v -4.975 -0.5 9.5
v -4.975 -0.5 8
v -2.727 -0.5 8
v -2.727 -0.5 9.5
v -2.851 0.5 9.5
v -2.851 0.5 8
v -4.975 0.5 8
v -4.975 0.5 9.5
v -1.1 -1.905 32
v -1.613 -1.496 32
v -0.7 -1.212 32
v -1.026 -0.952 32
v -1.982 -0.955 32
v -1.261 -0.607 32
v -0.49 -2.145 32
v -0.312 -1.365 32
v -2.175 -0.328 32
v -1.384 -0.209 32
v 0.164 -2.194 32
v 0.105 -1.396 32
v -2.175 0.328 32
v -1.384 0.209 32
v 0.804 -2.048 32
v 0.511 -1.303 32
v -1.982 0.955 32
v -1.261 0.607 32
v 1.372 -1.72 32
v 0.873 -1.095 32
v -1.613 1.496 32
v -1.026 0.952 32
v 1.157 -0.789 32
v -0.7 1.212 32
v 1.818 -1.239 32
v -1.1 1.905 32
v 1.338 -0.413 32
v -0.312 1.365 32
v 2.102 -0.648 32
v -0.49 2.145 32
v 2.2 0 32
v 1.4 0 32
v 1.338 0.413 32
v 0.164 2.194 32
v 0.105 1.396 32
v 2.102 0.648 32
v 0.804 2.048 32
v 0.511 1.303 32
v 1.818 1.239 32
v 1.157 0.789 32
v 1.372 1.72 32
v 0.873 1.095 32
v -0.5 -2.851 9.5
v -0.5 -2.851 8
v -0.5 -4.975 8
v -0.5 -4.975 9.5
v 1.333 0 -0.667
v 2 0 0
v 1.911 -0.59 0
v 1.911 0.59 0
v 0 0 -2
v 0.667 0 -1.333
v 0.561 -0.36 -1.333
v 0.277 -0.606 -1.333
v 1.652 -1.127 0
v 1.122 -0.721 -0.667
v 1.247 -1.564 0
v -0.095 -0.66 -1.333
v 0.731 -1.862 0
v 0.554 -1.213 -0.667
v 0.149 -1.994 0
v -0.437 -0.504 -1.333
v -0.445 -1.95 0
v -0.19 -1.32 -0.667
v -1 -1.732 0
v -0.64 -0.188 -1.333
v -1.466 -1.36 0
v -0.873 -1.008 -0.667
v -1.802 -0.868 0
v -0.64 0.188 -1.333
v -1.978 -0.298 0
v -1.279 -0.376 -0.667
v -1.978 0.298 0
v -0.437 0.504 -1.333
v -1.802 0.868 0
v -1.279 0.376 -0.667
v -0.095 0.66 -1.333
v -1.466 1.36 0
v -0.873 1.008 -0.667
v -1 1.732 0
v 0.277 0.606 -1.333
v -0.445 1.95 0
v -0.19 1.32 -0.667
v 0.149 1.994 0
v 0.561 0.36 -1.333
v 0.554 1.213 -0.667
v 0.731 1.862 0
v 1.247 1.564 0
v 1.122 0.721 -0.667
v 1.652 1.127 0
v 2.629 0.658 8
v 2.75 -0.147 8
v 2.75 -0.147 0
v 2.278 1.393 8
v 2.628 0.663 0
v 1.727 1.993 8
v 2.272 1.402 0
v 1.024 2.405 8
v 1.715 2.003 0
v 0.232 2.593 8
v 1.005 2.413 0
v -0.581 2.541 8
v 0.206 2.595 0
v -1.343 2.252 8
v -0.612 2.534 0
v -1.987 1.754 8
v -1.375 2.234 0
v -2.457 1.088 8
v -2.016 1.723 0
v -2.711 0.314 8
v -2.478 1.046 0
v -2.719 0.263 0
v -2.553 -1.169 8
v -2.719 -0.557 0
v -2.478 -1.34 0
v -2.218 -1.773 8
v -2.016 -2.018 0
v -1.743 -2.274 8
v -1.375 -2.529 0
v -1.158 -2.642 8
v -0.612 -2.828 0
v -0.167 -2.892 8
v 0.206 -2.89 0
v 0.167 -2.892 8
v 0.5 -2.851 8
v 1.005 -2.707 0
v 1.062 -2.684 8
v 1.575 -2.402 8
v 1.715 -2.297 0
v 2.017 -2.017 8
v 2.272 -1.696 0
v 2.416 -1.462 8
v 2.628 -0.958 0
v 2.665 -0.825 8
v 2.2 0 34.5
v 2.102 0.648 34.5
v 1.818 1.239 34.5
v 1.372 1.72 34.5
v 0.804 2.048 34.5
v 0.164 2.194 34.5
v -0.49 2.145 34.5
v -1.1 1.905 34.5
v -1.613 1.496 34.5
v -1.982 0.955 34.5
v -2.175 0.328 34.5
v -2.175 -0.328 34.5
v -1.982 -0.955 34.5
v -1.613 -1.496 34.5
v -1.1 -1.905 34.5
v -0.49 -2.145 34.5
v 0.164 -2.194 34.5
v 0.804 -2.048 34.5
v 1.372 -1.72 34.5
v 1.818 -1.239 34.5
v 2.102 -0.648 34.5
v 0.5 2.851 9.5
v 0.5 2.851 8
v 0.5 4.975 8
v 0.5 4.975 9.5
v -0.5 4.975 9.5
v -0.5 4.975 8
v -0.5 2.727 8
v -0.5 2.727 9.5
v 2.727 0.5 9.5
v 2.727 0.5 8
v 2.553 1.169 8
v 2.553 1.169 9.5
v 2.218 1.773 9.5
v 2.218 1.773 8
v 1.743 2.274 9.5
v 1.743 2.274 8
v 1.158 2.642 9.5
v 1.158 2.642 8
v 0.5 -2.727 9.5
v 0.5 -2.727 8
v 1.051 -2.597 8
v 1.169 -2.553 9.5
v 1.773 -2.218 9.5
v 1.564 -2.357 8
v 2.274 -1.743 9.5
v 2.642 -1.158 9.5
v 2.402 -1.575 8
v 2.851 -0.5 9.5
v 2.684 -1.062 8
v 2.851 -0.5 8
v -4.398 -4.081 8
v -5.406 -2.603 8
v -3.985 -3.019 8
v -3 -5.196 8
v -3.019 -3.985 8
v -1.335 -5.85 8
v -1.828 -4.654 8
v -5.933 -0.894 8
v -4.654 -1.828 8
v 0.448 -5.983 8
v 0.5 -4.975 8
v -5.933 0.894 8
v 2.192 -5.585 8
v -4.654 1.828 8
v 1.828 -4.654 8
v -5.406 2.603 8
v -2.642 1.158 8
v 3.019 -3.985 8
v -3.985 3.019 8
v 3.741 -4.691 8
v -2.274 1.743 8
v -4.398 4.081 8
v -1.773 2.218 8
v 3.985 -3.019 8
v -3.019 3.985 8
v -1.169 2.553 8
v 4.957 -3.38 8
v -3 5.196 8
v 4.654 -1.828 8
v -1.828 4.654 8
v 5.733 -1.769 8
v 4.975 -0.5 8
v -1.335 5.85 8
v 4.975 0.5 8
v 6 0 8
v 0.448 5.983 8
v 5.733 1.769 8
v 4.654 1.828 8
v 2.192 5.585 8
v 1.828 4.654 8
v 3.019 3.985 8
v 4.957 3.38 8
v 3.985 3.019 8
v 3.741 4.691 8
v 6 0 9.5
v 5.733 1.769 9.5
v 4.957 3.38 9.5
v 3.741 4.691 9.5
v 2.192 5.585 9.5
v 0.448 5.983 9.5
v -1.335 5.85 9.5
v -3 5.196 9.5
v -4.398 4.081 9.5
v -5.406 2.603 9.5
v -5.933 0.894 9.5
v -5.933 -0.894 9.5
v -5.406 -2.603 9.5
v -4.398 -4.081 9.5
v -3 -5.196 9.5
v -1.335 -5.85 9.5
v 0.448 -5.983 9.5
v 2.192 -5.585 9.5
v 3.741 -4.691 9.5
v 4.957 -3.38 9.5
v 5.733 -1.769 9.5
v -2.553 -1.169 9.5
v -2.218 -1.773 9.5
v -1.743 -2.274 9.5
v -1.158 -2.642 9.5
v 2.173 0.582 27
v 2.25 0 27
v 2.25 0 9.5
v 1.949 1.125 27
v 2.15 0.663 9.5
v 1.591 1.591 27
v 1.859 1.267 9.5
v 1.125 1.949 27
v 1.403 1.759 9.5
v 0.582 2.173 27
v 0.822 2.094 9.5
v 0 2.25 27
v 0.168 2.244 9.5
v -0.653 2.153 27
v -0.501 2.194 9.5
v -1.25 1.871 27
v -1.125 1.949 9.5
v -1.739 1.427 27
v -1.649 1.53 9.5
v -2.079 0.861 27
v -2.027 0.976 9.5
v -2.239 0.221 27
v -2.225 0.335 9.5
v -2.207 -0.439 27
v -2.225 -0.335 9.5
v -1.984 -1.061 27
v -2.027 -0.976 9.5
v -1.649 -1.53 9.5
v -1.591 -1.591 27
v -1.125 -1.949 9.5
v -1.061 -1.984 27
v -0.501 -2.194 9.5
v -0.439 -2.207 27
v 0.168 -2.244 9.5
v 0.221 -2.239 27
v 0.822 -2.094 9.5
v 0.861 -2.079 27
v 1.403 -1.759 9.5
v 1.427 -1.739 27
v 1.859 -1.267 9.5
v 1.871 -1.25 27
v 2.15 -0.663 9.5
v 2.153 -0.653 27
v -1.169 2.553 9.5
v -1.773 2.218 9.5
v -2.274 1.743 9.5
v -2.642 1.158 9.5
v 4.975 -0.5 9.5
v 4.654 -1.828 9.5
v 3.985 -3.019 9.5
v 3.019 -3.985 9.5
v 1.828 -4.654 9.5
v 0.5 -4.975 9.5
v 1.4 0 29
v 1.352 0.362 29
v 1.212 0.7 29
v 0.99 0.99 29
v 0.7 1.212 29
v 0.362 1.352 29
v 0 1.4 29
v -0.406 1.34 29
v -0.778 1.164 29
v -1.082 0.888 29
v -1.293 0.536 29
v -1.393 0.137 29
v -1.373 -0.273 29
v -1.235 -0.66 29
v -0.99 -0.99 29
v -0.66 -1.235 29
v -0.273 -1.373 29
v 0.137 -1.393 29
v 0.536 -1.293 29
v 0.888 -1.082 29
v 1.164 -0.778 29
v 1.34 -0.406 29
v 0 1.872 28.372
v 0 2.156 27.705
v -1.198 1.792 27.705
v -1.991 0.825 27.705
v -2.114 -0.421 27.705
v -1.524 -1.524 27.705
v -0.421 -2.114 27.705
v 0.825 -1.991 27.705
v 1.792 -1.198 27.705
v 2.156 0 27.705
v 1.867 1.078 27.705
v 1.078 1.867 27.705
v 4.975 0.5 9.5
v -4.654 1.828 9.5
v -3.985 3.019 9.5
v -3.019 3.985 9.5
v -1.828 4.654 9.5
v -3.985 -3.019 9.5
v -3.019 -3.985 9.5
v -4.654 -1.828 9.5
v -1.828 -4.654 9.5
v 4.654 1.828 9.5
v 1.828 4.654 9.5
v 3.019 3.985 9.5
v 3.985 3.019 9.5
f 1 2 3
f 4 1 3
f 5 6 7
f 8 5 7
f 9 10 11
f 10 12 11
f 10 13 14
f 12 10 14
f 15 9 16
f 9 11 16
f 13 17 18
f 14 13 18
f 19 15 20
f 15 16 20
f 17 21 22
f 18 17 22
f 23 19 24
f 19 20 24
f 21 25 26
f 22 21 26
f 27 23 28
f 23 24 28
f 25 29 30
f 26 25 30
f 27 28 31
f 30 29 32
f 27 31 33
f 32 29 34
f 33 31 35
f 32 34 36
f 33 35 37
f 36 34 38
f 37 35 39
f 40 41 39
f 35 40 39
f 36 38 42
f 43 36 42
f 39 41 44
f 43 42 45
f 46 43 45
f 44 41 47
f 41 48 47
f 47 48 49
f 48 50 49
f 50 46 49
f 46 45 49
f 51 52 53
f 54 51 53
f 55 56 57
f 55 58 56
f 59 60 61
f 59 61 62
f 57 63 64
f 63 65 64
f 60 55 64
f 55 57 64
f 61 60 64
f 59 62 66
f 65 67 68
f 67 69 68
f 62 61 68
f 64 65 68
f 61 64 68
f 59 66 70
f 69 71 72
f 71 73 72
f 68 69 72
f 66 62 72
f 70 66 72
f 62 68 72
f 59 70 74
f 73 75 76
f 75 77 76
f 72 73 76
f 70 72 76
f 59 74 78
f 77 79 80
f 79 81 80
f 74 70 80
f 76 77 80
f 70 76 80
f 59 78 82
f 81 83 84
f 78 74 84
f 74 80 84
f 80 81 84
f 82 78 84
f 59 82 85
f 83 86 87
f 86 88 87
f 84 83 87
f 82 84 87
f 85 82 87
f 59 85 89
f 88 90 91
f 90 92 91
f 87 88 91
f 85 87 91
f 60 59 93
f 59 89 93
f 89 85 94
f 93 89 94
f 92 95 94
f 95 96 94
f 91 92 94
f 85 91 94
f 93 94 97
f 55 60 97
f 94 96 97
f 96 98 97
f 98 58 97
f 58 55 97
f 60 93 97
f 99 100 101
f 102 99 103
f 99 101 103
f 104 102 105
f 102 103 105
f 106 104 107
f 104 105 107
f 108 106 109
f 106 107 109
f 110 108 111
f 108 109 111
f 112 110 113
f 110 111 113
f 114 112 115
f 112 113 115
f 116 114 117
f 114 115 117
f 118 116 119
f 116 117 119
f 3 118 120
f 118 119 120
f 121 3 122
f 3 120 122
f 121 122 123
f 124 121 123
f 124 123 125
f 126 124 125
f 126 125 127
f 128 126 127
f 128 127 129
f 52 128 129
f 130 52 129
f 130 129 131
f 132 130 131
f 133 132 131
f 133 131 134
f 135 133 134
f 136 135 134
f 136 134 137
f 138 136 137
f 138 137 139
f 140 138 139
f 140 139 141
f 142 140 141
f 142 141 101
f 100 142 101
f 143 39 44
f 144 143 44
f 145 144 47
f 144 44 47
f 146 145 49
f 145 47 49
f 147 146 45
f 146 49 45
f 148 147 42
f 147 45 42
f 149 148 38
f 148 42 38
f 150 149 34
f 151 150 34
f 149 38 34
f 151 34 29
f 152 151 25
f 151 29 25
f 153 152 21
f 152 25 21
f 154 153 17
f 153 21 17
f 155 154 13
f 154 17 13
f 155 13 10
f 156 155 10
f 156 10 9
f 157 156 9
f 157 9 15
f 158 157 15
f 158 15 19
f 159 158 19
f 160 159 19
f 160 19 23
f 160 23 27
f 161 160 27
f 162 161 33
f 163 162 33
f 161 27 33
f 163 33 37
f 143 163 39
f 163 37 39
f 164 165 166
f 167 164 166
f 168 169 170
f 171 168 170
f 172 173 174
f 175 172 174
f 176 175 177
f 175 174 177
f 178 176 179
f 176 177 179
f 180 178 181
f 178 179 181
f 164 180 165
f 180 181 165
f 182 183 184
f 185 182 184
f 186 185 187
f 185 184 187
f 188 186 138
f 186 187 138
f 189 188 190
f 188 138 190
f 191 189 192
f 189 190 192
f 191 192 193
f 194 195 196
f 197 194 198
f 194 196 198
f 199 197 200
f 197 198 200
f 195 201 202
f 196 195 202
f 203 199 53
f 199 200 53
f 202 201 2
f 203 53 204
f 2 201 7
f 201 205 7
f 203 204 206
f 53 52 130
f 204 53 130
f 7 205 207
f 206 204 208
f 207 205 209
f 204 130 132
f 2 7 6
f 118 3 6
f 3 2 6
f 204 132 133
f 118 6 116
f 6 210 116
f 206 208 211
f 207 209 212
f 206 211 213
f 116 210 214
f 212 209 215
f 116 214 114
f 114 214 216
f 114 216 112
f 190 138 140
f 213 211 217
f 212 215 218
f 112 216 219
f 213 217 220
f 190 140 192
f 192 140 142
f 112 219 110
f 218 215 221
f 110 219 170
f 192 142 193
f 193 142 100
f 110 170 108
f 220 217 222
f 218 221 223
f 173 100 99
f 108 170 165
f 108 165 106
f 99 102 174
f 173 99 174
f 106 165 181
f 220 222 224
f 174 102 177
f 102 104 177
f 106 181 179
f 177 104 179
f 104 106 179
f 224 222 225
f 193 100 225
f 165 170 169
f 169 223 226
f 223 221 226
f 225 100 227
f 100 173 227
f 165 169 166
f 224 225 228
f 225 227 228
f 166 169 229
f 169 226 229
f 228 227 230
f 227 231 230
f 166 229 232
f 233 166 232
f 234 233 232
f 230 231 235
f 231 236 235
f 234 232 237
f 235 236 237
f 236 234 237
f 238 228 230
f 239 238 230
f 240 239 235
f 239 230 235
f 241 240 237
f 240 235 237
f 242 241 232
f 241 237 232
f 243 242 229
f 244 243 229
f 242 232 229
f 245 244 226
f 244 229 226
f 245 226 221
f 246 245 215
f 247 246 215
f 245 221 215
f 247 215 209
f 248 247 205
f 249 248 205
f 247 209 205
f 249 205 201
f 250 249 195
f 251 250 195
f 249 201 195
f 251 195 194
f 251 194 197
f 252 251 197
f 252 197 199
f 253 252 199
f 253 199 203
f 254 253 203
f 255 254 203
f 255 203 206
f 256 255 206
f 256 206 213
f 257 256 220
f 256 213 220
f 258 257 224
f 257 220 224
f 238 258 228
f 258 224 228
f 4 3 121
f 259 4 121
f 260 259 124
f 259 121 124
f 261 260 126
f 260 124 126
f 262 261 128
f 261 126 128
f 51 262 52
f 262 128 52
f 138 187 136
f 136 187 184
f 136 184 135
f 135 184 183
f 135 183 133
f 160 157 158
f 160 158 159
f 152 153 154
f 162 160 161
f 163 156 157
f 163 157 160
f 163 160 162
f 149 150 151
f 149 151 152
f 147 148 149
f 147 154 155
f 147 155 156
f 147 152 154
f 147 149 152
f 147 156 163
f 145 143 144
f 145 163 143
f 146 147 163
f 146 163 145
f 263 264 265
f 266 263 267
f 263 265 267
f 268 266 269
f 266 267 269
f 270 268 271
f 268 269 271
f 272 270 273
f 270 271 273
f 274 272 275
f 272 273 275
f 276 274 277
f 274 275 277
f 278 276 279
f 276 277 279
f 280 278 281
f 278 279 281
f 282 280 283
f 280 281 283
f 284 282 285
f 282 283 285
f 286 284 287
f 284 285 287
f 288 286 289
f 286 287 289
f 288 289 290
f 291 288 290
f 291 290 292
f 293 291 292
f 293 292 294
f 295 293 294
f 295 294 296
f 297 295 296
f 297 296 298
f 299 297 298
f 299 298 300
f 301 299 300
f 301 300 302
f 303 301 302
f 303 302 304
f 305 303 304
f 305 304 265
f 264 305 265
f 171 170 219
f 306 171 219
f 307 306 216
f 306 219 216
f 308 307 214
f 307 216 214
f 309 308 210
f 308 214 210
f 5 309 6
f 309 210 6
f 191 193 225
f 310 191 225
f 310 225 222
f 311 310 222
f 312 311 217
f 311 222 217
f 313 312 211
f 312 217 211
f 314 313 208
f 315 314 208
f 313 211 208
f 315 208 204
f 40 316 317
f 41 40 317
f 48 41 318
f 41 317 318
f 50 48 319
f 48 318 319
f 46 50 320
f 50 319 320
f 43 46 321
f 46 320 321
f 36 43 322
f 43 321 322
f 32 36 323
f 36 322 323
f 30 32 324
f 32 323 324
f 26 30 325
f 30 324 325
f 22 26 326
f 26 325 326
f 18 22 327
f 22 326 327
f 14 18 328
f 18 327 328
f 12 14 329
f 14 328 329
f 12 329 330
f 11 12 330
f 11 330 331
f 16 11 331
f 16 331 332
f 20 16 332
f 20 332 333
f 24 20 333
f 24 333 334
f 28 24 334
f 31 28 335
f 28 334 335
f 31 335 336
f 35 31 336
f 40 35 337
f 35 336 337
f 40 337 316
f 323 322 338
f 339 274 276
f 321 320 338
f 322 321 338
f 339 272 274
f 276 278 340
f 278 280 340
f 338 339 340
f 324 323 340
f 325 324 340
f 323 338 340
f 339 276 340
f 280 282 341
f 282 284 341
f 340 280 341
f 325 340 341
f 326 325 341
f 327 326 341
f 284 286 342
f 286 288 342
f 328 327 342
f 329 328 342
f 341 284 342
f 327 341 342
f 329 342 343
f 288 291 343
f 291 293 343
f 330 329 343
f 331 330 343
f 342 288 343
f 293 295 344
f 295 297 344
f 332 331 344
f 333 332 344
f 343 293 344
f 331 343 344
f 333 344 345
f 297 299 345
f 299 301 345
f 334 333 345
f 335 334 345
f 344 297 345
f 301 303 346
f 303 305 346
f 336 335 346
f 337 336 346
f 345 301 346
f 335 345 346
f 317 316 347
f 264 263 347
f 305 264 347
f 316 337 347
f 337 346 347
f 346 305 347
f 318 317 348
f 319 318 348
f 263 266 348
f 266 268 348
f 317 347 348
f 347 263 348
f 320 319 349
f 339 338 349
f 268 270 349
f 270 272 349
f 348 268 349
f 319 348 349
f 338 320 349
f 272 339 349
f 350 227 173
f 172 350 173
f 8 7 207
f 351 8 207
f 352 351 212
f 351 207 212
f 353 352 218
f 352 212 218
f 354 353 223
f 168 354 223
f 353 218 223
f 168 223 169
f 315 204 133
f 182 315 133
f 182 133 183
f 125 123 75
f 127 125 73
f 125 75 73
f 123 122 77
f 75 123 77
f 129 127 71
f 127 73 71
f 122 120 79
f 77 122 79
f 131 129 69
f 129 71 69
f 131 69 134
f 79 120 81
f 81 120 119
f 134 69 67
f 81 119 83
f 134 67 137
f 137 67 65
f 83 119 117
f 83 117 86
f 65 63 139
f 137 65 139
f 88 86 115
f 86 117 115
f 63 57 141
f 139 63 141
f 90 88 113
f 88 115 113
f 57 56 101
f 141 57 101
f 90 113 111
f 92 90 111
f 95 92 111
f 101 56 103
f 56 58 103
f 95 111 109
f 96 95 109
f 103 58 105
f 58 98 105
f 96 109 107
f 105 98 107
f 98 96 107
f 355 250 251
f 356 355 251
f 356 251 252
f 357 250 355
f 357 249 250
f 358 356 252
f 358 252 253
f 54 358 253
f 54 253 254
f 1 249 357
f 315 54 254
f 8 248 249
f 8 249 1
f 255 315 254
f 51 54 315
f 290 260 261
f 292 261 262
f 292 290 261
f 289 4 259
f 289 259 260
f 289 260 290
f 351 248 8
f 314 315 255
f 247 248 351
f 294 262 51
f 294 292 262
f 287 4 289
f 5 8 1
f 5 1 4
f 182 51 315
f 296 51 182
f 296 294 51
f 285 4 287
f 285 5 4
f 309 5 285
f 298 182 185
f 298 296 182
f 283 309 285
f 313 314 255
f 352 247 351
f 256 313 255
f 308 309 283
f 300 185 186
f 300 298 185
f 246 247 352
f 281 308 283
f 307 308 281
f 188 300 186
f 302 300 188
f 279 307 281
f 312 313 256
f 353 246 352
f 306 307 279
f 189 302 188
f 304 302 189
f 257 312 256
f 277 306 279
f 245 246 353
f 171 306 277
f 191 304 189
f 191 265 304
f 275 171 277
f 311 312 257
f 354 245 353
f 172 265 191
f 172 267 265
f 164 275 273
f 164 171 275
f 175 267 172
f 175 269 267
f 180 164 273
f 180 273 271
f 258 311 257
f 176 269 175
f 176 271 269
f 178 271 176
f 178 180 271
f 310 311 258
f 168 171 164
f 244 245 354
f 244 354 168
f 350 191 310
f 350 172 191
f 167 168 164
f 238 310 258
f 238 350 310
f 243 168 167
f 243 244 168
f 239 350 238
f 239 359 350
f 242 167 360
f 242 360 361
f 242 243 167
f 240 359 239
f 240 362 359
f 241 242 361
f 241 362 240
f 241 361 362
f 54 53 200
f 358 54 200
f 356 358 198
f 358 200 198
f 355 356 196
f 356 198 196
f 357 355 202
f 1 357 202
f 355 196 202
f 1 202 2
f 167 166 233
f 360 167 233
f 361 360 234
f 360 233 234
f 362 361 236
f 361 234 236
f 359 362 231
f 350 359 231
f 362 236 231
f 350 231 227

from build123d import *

# Parameters (mm, degrees)
SKETCH1_R           = 2.75
BOSS_EXTRUDE1_DEPTH = 8
SKETCH5_R           = 2.25
BOSS_EXTRUDE2_DEPTH = 19
SKETCH6_R           = 6
BOSS_EXTRUDE4_DEPTH = 1.5
CUT_EXTRUDE1_DEPTH  = 1.5
CIRPATTERN1_COUNT   = 4
SKETCH11_R          = 1.4
BOSS_EXTRUDE5_DEPTH = 3
SKETCH12_R          = 2.2
BOSS_EXTRUDE6_DEPTH = 2.5


with BuildPart() as part:
    # Sketch1 → Boss-Extrude1 (new body)
    with BuildSketch(Plane.XY):
        with Locations((0, -0.147315355)):
            Circle(SKETCH1_R)
    extrude(amount=BOSS_EXTRUDE1_DEPTH)

    # Sketch4 → Revolve2 (revolve)
    with BuildSketch(Plane(origin=(0, 0, 0), x_dir=(1, 0, 0), z_dir=(0, 1, 0))):
        Polygon((0, 0), (0, 2), (-2, 0), align=None)
    revolve(axis=Axis((0, 0, 0), (0, 0, -1)))

    # Sketch5 → Boss-Extrude2 (add)
    with BuildSketch(Plane.XY.offset(8)):
        Circle(SKETCH5_R)
    extrude(amount=BOSS_EXTRUDE2_DEPTH)

    # Sketch6 → Boss-Extrude4 (add)
    with BuildSketch(Plane.XY.offset(8)):
        Circle(SKETCH6_R)
    extrude(amount=BOSS_EXTRUDE4_DEPTH)

    # Sketch7 → Cut-Extrude1 (cut)
    with BuildSketch(Plane(origin=(0, 0, 8), x_dir=(-1, 0, 0), z_dir=(0, 0, -1))):
        with BuildLine():
            ThreePointArc((0.5, -4.974937186), (3.535533906, -3.535533906), (4.974937186, -0.5))
            Line((4.974937186, -0.5), (2.727290513, -0.5))
            ThreePointArc((2.727290513, -0.5), (1.996550566, -2.038422395), (0.5, -2.851478812))
            Line((0.5, -2.851478812), (0.5, -4.974937186))
        make_face()
    cut_extrude1 = extrude(amount=-CUT_EXTRUDE1_DEPTH, mode=Mode.SUBTRACT)

    # CirPattern1: Cut-Extrude1 ×4 about axis
    cirpattern1_axis = Axis((0, 0, 8), (0, 0, 1))
    for i in range(1, CIRPATTERN1_COUNT):
        add(cut_extrude1.rotate(cirpattern1_axis, i * 360 / CIRPATTERN1_COUNT), mode=Mode.SUBTRACT)

    # Sketch10 → Revolve3 (revolve)
    with BuildSketch(Plane(origin=(0, 0, 0), x_dir=(0, 0, -1), z_dir=(1, 0, 0))):
        with BuildLine():
            Line((-27, 0), (-29, 0))
            Line((-29, 0), (-29, 1.4))
            add(Edge.make_bspline(
                [(-29, 1.4), (-28.086565691, 2.25), (-27, 2.25)],
                knots=[0, 0, 0, 1, 1, 1], degree=2))
            Line((-27, 2.25), (-27, 0))
        make_face()
    revolve(axis=Axis((0, 0, 27), (0, 0, 1)))

    # Sketch11 → Boss-Extrude5 (add)
    with BuildSketch(Plane.XY.offset(29)):
        Circle(SKETCH11_R)
    extrude(amount=BOSS_EXTRUDE5_DEPTH)

    # Sketch12 → Boss-Extrude6 (add)
    with BuildSketch(Plane.XY.offset(32)):
        Circle(SKETCH12_R)
    extrude(amount=BOSS_EXTRUDE6_DEPTH)


solid = part.part
